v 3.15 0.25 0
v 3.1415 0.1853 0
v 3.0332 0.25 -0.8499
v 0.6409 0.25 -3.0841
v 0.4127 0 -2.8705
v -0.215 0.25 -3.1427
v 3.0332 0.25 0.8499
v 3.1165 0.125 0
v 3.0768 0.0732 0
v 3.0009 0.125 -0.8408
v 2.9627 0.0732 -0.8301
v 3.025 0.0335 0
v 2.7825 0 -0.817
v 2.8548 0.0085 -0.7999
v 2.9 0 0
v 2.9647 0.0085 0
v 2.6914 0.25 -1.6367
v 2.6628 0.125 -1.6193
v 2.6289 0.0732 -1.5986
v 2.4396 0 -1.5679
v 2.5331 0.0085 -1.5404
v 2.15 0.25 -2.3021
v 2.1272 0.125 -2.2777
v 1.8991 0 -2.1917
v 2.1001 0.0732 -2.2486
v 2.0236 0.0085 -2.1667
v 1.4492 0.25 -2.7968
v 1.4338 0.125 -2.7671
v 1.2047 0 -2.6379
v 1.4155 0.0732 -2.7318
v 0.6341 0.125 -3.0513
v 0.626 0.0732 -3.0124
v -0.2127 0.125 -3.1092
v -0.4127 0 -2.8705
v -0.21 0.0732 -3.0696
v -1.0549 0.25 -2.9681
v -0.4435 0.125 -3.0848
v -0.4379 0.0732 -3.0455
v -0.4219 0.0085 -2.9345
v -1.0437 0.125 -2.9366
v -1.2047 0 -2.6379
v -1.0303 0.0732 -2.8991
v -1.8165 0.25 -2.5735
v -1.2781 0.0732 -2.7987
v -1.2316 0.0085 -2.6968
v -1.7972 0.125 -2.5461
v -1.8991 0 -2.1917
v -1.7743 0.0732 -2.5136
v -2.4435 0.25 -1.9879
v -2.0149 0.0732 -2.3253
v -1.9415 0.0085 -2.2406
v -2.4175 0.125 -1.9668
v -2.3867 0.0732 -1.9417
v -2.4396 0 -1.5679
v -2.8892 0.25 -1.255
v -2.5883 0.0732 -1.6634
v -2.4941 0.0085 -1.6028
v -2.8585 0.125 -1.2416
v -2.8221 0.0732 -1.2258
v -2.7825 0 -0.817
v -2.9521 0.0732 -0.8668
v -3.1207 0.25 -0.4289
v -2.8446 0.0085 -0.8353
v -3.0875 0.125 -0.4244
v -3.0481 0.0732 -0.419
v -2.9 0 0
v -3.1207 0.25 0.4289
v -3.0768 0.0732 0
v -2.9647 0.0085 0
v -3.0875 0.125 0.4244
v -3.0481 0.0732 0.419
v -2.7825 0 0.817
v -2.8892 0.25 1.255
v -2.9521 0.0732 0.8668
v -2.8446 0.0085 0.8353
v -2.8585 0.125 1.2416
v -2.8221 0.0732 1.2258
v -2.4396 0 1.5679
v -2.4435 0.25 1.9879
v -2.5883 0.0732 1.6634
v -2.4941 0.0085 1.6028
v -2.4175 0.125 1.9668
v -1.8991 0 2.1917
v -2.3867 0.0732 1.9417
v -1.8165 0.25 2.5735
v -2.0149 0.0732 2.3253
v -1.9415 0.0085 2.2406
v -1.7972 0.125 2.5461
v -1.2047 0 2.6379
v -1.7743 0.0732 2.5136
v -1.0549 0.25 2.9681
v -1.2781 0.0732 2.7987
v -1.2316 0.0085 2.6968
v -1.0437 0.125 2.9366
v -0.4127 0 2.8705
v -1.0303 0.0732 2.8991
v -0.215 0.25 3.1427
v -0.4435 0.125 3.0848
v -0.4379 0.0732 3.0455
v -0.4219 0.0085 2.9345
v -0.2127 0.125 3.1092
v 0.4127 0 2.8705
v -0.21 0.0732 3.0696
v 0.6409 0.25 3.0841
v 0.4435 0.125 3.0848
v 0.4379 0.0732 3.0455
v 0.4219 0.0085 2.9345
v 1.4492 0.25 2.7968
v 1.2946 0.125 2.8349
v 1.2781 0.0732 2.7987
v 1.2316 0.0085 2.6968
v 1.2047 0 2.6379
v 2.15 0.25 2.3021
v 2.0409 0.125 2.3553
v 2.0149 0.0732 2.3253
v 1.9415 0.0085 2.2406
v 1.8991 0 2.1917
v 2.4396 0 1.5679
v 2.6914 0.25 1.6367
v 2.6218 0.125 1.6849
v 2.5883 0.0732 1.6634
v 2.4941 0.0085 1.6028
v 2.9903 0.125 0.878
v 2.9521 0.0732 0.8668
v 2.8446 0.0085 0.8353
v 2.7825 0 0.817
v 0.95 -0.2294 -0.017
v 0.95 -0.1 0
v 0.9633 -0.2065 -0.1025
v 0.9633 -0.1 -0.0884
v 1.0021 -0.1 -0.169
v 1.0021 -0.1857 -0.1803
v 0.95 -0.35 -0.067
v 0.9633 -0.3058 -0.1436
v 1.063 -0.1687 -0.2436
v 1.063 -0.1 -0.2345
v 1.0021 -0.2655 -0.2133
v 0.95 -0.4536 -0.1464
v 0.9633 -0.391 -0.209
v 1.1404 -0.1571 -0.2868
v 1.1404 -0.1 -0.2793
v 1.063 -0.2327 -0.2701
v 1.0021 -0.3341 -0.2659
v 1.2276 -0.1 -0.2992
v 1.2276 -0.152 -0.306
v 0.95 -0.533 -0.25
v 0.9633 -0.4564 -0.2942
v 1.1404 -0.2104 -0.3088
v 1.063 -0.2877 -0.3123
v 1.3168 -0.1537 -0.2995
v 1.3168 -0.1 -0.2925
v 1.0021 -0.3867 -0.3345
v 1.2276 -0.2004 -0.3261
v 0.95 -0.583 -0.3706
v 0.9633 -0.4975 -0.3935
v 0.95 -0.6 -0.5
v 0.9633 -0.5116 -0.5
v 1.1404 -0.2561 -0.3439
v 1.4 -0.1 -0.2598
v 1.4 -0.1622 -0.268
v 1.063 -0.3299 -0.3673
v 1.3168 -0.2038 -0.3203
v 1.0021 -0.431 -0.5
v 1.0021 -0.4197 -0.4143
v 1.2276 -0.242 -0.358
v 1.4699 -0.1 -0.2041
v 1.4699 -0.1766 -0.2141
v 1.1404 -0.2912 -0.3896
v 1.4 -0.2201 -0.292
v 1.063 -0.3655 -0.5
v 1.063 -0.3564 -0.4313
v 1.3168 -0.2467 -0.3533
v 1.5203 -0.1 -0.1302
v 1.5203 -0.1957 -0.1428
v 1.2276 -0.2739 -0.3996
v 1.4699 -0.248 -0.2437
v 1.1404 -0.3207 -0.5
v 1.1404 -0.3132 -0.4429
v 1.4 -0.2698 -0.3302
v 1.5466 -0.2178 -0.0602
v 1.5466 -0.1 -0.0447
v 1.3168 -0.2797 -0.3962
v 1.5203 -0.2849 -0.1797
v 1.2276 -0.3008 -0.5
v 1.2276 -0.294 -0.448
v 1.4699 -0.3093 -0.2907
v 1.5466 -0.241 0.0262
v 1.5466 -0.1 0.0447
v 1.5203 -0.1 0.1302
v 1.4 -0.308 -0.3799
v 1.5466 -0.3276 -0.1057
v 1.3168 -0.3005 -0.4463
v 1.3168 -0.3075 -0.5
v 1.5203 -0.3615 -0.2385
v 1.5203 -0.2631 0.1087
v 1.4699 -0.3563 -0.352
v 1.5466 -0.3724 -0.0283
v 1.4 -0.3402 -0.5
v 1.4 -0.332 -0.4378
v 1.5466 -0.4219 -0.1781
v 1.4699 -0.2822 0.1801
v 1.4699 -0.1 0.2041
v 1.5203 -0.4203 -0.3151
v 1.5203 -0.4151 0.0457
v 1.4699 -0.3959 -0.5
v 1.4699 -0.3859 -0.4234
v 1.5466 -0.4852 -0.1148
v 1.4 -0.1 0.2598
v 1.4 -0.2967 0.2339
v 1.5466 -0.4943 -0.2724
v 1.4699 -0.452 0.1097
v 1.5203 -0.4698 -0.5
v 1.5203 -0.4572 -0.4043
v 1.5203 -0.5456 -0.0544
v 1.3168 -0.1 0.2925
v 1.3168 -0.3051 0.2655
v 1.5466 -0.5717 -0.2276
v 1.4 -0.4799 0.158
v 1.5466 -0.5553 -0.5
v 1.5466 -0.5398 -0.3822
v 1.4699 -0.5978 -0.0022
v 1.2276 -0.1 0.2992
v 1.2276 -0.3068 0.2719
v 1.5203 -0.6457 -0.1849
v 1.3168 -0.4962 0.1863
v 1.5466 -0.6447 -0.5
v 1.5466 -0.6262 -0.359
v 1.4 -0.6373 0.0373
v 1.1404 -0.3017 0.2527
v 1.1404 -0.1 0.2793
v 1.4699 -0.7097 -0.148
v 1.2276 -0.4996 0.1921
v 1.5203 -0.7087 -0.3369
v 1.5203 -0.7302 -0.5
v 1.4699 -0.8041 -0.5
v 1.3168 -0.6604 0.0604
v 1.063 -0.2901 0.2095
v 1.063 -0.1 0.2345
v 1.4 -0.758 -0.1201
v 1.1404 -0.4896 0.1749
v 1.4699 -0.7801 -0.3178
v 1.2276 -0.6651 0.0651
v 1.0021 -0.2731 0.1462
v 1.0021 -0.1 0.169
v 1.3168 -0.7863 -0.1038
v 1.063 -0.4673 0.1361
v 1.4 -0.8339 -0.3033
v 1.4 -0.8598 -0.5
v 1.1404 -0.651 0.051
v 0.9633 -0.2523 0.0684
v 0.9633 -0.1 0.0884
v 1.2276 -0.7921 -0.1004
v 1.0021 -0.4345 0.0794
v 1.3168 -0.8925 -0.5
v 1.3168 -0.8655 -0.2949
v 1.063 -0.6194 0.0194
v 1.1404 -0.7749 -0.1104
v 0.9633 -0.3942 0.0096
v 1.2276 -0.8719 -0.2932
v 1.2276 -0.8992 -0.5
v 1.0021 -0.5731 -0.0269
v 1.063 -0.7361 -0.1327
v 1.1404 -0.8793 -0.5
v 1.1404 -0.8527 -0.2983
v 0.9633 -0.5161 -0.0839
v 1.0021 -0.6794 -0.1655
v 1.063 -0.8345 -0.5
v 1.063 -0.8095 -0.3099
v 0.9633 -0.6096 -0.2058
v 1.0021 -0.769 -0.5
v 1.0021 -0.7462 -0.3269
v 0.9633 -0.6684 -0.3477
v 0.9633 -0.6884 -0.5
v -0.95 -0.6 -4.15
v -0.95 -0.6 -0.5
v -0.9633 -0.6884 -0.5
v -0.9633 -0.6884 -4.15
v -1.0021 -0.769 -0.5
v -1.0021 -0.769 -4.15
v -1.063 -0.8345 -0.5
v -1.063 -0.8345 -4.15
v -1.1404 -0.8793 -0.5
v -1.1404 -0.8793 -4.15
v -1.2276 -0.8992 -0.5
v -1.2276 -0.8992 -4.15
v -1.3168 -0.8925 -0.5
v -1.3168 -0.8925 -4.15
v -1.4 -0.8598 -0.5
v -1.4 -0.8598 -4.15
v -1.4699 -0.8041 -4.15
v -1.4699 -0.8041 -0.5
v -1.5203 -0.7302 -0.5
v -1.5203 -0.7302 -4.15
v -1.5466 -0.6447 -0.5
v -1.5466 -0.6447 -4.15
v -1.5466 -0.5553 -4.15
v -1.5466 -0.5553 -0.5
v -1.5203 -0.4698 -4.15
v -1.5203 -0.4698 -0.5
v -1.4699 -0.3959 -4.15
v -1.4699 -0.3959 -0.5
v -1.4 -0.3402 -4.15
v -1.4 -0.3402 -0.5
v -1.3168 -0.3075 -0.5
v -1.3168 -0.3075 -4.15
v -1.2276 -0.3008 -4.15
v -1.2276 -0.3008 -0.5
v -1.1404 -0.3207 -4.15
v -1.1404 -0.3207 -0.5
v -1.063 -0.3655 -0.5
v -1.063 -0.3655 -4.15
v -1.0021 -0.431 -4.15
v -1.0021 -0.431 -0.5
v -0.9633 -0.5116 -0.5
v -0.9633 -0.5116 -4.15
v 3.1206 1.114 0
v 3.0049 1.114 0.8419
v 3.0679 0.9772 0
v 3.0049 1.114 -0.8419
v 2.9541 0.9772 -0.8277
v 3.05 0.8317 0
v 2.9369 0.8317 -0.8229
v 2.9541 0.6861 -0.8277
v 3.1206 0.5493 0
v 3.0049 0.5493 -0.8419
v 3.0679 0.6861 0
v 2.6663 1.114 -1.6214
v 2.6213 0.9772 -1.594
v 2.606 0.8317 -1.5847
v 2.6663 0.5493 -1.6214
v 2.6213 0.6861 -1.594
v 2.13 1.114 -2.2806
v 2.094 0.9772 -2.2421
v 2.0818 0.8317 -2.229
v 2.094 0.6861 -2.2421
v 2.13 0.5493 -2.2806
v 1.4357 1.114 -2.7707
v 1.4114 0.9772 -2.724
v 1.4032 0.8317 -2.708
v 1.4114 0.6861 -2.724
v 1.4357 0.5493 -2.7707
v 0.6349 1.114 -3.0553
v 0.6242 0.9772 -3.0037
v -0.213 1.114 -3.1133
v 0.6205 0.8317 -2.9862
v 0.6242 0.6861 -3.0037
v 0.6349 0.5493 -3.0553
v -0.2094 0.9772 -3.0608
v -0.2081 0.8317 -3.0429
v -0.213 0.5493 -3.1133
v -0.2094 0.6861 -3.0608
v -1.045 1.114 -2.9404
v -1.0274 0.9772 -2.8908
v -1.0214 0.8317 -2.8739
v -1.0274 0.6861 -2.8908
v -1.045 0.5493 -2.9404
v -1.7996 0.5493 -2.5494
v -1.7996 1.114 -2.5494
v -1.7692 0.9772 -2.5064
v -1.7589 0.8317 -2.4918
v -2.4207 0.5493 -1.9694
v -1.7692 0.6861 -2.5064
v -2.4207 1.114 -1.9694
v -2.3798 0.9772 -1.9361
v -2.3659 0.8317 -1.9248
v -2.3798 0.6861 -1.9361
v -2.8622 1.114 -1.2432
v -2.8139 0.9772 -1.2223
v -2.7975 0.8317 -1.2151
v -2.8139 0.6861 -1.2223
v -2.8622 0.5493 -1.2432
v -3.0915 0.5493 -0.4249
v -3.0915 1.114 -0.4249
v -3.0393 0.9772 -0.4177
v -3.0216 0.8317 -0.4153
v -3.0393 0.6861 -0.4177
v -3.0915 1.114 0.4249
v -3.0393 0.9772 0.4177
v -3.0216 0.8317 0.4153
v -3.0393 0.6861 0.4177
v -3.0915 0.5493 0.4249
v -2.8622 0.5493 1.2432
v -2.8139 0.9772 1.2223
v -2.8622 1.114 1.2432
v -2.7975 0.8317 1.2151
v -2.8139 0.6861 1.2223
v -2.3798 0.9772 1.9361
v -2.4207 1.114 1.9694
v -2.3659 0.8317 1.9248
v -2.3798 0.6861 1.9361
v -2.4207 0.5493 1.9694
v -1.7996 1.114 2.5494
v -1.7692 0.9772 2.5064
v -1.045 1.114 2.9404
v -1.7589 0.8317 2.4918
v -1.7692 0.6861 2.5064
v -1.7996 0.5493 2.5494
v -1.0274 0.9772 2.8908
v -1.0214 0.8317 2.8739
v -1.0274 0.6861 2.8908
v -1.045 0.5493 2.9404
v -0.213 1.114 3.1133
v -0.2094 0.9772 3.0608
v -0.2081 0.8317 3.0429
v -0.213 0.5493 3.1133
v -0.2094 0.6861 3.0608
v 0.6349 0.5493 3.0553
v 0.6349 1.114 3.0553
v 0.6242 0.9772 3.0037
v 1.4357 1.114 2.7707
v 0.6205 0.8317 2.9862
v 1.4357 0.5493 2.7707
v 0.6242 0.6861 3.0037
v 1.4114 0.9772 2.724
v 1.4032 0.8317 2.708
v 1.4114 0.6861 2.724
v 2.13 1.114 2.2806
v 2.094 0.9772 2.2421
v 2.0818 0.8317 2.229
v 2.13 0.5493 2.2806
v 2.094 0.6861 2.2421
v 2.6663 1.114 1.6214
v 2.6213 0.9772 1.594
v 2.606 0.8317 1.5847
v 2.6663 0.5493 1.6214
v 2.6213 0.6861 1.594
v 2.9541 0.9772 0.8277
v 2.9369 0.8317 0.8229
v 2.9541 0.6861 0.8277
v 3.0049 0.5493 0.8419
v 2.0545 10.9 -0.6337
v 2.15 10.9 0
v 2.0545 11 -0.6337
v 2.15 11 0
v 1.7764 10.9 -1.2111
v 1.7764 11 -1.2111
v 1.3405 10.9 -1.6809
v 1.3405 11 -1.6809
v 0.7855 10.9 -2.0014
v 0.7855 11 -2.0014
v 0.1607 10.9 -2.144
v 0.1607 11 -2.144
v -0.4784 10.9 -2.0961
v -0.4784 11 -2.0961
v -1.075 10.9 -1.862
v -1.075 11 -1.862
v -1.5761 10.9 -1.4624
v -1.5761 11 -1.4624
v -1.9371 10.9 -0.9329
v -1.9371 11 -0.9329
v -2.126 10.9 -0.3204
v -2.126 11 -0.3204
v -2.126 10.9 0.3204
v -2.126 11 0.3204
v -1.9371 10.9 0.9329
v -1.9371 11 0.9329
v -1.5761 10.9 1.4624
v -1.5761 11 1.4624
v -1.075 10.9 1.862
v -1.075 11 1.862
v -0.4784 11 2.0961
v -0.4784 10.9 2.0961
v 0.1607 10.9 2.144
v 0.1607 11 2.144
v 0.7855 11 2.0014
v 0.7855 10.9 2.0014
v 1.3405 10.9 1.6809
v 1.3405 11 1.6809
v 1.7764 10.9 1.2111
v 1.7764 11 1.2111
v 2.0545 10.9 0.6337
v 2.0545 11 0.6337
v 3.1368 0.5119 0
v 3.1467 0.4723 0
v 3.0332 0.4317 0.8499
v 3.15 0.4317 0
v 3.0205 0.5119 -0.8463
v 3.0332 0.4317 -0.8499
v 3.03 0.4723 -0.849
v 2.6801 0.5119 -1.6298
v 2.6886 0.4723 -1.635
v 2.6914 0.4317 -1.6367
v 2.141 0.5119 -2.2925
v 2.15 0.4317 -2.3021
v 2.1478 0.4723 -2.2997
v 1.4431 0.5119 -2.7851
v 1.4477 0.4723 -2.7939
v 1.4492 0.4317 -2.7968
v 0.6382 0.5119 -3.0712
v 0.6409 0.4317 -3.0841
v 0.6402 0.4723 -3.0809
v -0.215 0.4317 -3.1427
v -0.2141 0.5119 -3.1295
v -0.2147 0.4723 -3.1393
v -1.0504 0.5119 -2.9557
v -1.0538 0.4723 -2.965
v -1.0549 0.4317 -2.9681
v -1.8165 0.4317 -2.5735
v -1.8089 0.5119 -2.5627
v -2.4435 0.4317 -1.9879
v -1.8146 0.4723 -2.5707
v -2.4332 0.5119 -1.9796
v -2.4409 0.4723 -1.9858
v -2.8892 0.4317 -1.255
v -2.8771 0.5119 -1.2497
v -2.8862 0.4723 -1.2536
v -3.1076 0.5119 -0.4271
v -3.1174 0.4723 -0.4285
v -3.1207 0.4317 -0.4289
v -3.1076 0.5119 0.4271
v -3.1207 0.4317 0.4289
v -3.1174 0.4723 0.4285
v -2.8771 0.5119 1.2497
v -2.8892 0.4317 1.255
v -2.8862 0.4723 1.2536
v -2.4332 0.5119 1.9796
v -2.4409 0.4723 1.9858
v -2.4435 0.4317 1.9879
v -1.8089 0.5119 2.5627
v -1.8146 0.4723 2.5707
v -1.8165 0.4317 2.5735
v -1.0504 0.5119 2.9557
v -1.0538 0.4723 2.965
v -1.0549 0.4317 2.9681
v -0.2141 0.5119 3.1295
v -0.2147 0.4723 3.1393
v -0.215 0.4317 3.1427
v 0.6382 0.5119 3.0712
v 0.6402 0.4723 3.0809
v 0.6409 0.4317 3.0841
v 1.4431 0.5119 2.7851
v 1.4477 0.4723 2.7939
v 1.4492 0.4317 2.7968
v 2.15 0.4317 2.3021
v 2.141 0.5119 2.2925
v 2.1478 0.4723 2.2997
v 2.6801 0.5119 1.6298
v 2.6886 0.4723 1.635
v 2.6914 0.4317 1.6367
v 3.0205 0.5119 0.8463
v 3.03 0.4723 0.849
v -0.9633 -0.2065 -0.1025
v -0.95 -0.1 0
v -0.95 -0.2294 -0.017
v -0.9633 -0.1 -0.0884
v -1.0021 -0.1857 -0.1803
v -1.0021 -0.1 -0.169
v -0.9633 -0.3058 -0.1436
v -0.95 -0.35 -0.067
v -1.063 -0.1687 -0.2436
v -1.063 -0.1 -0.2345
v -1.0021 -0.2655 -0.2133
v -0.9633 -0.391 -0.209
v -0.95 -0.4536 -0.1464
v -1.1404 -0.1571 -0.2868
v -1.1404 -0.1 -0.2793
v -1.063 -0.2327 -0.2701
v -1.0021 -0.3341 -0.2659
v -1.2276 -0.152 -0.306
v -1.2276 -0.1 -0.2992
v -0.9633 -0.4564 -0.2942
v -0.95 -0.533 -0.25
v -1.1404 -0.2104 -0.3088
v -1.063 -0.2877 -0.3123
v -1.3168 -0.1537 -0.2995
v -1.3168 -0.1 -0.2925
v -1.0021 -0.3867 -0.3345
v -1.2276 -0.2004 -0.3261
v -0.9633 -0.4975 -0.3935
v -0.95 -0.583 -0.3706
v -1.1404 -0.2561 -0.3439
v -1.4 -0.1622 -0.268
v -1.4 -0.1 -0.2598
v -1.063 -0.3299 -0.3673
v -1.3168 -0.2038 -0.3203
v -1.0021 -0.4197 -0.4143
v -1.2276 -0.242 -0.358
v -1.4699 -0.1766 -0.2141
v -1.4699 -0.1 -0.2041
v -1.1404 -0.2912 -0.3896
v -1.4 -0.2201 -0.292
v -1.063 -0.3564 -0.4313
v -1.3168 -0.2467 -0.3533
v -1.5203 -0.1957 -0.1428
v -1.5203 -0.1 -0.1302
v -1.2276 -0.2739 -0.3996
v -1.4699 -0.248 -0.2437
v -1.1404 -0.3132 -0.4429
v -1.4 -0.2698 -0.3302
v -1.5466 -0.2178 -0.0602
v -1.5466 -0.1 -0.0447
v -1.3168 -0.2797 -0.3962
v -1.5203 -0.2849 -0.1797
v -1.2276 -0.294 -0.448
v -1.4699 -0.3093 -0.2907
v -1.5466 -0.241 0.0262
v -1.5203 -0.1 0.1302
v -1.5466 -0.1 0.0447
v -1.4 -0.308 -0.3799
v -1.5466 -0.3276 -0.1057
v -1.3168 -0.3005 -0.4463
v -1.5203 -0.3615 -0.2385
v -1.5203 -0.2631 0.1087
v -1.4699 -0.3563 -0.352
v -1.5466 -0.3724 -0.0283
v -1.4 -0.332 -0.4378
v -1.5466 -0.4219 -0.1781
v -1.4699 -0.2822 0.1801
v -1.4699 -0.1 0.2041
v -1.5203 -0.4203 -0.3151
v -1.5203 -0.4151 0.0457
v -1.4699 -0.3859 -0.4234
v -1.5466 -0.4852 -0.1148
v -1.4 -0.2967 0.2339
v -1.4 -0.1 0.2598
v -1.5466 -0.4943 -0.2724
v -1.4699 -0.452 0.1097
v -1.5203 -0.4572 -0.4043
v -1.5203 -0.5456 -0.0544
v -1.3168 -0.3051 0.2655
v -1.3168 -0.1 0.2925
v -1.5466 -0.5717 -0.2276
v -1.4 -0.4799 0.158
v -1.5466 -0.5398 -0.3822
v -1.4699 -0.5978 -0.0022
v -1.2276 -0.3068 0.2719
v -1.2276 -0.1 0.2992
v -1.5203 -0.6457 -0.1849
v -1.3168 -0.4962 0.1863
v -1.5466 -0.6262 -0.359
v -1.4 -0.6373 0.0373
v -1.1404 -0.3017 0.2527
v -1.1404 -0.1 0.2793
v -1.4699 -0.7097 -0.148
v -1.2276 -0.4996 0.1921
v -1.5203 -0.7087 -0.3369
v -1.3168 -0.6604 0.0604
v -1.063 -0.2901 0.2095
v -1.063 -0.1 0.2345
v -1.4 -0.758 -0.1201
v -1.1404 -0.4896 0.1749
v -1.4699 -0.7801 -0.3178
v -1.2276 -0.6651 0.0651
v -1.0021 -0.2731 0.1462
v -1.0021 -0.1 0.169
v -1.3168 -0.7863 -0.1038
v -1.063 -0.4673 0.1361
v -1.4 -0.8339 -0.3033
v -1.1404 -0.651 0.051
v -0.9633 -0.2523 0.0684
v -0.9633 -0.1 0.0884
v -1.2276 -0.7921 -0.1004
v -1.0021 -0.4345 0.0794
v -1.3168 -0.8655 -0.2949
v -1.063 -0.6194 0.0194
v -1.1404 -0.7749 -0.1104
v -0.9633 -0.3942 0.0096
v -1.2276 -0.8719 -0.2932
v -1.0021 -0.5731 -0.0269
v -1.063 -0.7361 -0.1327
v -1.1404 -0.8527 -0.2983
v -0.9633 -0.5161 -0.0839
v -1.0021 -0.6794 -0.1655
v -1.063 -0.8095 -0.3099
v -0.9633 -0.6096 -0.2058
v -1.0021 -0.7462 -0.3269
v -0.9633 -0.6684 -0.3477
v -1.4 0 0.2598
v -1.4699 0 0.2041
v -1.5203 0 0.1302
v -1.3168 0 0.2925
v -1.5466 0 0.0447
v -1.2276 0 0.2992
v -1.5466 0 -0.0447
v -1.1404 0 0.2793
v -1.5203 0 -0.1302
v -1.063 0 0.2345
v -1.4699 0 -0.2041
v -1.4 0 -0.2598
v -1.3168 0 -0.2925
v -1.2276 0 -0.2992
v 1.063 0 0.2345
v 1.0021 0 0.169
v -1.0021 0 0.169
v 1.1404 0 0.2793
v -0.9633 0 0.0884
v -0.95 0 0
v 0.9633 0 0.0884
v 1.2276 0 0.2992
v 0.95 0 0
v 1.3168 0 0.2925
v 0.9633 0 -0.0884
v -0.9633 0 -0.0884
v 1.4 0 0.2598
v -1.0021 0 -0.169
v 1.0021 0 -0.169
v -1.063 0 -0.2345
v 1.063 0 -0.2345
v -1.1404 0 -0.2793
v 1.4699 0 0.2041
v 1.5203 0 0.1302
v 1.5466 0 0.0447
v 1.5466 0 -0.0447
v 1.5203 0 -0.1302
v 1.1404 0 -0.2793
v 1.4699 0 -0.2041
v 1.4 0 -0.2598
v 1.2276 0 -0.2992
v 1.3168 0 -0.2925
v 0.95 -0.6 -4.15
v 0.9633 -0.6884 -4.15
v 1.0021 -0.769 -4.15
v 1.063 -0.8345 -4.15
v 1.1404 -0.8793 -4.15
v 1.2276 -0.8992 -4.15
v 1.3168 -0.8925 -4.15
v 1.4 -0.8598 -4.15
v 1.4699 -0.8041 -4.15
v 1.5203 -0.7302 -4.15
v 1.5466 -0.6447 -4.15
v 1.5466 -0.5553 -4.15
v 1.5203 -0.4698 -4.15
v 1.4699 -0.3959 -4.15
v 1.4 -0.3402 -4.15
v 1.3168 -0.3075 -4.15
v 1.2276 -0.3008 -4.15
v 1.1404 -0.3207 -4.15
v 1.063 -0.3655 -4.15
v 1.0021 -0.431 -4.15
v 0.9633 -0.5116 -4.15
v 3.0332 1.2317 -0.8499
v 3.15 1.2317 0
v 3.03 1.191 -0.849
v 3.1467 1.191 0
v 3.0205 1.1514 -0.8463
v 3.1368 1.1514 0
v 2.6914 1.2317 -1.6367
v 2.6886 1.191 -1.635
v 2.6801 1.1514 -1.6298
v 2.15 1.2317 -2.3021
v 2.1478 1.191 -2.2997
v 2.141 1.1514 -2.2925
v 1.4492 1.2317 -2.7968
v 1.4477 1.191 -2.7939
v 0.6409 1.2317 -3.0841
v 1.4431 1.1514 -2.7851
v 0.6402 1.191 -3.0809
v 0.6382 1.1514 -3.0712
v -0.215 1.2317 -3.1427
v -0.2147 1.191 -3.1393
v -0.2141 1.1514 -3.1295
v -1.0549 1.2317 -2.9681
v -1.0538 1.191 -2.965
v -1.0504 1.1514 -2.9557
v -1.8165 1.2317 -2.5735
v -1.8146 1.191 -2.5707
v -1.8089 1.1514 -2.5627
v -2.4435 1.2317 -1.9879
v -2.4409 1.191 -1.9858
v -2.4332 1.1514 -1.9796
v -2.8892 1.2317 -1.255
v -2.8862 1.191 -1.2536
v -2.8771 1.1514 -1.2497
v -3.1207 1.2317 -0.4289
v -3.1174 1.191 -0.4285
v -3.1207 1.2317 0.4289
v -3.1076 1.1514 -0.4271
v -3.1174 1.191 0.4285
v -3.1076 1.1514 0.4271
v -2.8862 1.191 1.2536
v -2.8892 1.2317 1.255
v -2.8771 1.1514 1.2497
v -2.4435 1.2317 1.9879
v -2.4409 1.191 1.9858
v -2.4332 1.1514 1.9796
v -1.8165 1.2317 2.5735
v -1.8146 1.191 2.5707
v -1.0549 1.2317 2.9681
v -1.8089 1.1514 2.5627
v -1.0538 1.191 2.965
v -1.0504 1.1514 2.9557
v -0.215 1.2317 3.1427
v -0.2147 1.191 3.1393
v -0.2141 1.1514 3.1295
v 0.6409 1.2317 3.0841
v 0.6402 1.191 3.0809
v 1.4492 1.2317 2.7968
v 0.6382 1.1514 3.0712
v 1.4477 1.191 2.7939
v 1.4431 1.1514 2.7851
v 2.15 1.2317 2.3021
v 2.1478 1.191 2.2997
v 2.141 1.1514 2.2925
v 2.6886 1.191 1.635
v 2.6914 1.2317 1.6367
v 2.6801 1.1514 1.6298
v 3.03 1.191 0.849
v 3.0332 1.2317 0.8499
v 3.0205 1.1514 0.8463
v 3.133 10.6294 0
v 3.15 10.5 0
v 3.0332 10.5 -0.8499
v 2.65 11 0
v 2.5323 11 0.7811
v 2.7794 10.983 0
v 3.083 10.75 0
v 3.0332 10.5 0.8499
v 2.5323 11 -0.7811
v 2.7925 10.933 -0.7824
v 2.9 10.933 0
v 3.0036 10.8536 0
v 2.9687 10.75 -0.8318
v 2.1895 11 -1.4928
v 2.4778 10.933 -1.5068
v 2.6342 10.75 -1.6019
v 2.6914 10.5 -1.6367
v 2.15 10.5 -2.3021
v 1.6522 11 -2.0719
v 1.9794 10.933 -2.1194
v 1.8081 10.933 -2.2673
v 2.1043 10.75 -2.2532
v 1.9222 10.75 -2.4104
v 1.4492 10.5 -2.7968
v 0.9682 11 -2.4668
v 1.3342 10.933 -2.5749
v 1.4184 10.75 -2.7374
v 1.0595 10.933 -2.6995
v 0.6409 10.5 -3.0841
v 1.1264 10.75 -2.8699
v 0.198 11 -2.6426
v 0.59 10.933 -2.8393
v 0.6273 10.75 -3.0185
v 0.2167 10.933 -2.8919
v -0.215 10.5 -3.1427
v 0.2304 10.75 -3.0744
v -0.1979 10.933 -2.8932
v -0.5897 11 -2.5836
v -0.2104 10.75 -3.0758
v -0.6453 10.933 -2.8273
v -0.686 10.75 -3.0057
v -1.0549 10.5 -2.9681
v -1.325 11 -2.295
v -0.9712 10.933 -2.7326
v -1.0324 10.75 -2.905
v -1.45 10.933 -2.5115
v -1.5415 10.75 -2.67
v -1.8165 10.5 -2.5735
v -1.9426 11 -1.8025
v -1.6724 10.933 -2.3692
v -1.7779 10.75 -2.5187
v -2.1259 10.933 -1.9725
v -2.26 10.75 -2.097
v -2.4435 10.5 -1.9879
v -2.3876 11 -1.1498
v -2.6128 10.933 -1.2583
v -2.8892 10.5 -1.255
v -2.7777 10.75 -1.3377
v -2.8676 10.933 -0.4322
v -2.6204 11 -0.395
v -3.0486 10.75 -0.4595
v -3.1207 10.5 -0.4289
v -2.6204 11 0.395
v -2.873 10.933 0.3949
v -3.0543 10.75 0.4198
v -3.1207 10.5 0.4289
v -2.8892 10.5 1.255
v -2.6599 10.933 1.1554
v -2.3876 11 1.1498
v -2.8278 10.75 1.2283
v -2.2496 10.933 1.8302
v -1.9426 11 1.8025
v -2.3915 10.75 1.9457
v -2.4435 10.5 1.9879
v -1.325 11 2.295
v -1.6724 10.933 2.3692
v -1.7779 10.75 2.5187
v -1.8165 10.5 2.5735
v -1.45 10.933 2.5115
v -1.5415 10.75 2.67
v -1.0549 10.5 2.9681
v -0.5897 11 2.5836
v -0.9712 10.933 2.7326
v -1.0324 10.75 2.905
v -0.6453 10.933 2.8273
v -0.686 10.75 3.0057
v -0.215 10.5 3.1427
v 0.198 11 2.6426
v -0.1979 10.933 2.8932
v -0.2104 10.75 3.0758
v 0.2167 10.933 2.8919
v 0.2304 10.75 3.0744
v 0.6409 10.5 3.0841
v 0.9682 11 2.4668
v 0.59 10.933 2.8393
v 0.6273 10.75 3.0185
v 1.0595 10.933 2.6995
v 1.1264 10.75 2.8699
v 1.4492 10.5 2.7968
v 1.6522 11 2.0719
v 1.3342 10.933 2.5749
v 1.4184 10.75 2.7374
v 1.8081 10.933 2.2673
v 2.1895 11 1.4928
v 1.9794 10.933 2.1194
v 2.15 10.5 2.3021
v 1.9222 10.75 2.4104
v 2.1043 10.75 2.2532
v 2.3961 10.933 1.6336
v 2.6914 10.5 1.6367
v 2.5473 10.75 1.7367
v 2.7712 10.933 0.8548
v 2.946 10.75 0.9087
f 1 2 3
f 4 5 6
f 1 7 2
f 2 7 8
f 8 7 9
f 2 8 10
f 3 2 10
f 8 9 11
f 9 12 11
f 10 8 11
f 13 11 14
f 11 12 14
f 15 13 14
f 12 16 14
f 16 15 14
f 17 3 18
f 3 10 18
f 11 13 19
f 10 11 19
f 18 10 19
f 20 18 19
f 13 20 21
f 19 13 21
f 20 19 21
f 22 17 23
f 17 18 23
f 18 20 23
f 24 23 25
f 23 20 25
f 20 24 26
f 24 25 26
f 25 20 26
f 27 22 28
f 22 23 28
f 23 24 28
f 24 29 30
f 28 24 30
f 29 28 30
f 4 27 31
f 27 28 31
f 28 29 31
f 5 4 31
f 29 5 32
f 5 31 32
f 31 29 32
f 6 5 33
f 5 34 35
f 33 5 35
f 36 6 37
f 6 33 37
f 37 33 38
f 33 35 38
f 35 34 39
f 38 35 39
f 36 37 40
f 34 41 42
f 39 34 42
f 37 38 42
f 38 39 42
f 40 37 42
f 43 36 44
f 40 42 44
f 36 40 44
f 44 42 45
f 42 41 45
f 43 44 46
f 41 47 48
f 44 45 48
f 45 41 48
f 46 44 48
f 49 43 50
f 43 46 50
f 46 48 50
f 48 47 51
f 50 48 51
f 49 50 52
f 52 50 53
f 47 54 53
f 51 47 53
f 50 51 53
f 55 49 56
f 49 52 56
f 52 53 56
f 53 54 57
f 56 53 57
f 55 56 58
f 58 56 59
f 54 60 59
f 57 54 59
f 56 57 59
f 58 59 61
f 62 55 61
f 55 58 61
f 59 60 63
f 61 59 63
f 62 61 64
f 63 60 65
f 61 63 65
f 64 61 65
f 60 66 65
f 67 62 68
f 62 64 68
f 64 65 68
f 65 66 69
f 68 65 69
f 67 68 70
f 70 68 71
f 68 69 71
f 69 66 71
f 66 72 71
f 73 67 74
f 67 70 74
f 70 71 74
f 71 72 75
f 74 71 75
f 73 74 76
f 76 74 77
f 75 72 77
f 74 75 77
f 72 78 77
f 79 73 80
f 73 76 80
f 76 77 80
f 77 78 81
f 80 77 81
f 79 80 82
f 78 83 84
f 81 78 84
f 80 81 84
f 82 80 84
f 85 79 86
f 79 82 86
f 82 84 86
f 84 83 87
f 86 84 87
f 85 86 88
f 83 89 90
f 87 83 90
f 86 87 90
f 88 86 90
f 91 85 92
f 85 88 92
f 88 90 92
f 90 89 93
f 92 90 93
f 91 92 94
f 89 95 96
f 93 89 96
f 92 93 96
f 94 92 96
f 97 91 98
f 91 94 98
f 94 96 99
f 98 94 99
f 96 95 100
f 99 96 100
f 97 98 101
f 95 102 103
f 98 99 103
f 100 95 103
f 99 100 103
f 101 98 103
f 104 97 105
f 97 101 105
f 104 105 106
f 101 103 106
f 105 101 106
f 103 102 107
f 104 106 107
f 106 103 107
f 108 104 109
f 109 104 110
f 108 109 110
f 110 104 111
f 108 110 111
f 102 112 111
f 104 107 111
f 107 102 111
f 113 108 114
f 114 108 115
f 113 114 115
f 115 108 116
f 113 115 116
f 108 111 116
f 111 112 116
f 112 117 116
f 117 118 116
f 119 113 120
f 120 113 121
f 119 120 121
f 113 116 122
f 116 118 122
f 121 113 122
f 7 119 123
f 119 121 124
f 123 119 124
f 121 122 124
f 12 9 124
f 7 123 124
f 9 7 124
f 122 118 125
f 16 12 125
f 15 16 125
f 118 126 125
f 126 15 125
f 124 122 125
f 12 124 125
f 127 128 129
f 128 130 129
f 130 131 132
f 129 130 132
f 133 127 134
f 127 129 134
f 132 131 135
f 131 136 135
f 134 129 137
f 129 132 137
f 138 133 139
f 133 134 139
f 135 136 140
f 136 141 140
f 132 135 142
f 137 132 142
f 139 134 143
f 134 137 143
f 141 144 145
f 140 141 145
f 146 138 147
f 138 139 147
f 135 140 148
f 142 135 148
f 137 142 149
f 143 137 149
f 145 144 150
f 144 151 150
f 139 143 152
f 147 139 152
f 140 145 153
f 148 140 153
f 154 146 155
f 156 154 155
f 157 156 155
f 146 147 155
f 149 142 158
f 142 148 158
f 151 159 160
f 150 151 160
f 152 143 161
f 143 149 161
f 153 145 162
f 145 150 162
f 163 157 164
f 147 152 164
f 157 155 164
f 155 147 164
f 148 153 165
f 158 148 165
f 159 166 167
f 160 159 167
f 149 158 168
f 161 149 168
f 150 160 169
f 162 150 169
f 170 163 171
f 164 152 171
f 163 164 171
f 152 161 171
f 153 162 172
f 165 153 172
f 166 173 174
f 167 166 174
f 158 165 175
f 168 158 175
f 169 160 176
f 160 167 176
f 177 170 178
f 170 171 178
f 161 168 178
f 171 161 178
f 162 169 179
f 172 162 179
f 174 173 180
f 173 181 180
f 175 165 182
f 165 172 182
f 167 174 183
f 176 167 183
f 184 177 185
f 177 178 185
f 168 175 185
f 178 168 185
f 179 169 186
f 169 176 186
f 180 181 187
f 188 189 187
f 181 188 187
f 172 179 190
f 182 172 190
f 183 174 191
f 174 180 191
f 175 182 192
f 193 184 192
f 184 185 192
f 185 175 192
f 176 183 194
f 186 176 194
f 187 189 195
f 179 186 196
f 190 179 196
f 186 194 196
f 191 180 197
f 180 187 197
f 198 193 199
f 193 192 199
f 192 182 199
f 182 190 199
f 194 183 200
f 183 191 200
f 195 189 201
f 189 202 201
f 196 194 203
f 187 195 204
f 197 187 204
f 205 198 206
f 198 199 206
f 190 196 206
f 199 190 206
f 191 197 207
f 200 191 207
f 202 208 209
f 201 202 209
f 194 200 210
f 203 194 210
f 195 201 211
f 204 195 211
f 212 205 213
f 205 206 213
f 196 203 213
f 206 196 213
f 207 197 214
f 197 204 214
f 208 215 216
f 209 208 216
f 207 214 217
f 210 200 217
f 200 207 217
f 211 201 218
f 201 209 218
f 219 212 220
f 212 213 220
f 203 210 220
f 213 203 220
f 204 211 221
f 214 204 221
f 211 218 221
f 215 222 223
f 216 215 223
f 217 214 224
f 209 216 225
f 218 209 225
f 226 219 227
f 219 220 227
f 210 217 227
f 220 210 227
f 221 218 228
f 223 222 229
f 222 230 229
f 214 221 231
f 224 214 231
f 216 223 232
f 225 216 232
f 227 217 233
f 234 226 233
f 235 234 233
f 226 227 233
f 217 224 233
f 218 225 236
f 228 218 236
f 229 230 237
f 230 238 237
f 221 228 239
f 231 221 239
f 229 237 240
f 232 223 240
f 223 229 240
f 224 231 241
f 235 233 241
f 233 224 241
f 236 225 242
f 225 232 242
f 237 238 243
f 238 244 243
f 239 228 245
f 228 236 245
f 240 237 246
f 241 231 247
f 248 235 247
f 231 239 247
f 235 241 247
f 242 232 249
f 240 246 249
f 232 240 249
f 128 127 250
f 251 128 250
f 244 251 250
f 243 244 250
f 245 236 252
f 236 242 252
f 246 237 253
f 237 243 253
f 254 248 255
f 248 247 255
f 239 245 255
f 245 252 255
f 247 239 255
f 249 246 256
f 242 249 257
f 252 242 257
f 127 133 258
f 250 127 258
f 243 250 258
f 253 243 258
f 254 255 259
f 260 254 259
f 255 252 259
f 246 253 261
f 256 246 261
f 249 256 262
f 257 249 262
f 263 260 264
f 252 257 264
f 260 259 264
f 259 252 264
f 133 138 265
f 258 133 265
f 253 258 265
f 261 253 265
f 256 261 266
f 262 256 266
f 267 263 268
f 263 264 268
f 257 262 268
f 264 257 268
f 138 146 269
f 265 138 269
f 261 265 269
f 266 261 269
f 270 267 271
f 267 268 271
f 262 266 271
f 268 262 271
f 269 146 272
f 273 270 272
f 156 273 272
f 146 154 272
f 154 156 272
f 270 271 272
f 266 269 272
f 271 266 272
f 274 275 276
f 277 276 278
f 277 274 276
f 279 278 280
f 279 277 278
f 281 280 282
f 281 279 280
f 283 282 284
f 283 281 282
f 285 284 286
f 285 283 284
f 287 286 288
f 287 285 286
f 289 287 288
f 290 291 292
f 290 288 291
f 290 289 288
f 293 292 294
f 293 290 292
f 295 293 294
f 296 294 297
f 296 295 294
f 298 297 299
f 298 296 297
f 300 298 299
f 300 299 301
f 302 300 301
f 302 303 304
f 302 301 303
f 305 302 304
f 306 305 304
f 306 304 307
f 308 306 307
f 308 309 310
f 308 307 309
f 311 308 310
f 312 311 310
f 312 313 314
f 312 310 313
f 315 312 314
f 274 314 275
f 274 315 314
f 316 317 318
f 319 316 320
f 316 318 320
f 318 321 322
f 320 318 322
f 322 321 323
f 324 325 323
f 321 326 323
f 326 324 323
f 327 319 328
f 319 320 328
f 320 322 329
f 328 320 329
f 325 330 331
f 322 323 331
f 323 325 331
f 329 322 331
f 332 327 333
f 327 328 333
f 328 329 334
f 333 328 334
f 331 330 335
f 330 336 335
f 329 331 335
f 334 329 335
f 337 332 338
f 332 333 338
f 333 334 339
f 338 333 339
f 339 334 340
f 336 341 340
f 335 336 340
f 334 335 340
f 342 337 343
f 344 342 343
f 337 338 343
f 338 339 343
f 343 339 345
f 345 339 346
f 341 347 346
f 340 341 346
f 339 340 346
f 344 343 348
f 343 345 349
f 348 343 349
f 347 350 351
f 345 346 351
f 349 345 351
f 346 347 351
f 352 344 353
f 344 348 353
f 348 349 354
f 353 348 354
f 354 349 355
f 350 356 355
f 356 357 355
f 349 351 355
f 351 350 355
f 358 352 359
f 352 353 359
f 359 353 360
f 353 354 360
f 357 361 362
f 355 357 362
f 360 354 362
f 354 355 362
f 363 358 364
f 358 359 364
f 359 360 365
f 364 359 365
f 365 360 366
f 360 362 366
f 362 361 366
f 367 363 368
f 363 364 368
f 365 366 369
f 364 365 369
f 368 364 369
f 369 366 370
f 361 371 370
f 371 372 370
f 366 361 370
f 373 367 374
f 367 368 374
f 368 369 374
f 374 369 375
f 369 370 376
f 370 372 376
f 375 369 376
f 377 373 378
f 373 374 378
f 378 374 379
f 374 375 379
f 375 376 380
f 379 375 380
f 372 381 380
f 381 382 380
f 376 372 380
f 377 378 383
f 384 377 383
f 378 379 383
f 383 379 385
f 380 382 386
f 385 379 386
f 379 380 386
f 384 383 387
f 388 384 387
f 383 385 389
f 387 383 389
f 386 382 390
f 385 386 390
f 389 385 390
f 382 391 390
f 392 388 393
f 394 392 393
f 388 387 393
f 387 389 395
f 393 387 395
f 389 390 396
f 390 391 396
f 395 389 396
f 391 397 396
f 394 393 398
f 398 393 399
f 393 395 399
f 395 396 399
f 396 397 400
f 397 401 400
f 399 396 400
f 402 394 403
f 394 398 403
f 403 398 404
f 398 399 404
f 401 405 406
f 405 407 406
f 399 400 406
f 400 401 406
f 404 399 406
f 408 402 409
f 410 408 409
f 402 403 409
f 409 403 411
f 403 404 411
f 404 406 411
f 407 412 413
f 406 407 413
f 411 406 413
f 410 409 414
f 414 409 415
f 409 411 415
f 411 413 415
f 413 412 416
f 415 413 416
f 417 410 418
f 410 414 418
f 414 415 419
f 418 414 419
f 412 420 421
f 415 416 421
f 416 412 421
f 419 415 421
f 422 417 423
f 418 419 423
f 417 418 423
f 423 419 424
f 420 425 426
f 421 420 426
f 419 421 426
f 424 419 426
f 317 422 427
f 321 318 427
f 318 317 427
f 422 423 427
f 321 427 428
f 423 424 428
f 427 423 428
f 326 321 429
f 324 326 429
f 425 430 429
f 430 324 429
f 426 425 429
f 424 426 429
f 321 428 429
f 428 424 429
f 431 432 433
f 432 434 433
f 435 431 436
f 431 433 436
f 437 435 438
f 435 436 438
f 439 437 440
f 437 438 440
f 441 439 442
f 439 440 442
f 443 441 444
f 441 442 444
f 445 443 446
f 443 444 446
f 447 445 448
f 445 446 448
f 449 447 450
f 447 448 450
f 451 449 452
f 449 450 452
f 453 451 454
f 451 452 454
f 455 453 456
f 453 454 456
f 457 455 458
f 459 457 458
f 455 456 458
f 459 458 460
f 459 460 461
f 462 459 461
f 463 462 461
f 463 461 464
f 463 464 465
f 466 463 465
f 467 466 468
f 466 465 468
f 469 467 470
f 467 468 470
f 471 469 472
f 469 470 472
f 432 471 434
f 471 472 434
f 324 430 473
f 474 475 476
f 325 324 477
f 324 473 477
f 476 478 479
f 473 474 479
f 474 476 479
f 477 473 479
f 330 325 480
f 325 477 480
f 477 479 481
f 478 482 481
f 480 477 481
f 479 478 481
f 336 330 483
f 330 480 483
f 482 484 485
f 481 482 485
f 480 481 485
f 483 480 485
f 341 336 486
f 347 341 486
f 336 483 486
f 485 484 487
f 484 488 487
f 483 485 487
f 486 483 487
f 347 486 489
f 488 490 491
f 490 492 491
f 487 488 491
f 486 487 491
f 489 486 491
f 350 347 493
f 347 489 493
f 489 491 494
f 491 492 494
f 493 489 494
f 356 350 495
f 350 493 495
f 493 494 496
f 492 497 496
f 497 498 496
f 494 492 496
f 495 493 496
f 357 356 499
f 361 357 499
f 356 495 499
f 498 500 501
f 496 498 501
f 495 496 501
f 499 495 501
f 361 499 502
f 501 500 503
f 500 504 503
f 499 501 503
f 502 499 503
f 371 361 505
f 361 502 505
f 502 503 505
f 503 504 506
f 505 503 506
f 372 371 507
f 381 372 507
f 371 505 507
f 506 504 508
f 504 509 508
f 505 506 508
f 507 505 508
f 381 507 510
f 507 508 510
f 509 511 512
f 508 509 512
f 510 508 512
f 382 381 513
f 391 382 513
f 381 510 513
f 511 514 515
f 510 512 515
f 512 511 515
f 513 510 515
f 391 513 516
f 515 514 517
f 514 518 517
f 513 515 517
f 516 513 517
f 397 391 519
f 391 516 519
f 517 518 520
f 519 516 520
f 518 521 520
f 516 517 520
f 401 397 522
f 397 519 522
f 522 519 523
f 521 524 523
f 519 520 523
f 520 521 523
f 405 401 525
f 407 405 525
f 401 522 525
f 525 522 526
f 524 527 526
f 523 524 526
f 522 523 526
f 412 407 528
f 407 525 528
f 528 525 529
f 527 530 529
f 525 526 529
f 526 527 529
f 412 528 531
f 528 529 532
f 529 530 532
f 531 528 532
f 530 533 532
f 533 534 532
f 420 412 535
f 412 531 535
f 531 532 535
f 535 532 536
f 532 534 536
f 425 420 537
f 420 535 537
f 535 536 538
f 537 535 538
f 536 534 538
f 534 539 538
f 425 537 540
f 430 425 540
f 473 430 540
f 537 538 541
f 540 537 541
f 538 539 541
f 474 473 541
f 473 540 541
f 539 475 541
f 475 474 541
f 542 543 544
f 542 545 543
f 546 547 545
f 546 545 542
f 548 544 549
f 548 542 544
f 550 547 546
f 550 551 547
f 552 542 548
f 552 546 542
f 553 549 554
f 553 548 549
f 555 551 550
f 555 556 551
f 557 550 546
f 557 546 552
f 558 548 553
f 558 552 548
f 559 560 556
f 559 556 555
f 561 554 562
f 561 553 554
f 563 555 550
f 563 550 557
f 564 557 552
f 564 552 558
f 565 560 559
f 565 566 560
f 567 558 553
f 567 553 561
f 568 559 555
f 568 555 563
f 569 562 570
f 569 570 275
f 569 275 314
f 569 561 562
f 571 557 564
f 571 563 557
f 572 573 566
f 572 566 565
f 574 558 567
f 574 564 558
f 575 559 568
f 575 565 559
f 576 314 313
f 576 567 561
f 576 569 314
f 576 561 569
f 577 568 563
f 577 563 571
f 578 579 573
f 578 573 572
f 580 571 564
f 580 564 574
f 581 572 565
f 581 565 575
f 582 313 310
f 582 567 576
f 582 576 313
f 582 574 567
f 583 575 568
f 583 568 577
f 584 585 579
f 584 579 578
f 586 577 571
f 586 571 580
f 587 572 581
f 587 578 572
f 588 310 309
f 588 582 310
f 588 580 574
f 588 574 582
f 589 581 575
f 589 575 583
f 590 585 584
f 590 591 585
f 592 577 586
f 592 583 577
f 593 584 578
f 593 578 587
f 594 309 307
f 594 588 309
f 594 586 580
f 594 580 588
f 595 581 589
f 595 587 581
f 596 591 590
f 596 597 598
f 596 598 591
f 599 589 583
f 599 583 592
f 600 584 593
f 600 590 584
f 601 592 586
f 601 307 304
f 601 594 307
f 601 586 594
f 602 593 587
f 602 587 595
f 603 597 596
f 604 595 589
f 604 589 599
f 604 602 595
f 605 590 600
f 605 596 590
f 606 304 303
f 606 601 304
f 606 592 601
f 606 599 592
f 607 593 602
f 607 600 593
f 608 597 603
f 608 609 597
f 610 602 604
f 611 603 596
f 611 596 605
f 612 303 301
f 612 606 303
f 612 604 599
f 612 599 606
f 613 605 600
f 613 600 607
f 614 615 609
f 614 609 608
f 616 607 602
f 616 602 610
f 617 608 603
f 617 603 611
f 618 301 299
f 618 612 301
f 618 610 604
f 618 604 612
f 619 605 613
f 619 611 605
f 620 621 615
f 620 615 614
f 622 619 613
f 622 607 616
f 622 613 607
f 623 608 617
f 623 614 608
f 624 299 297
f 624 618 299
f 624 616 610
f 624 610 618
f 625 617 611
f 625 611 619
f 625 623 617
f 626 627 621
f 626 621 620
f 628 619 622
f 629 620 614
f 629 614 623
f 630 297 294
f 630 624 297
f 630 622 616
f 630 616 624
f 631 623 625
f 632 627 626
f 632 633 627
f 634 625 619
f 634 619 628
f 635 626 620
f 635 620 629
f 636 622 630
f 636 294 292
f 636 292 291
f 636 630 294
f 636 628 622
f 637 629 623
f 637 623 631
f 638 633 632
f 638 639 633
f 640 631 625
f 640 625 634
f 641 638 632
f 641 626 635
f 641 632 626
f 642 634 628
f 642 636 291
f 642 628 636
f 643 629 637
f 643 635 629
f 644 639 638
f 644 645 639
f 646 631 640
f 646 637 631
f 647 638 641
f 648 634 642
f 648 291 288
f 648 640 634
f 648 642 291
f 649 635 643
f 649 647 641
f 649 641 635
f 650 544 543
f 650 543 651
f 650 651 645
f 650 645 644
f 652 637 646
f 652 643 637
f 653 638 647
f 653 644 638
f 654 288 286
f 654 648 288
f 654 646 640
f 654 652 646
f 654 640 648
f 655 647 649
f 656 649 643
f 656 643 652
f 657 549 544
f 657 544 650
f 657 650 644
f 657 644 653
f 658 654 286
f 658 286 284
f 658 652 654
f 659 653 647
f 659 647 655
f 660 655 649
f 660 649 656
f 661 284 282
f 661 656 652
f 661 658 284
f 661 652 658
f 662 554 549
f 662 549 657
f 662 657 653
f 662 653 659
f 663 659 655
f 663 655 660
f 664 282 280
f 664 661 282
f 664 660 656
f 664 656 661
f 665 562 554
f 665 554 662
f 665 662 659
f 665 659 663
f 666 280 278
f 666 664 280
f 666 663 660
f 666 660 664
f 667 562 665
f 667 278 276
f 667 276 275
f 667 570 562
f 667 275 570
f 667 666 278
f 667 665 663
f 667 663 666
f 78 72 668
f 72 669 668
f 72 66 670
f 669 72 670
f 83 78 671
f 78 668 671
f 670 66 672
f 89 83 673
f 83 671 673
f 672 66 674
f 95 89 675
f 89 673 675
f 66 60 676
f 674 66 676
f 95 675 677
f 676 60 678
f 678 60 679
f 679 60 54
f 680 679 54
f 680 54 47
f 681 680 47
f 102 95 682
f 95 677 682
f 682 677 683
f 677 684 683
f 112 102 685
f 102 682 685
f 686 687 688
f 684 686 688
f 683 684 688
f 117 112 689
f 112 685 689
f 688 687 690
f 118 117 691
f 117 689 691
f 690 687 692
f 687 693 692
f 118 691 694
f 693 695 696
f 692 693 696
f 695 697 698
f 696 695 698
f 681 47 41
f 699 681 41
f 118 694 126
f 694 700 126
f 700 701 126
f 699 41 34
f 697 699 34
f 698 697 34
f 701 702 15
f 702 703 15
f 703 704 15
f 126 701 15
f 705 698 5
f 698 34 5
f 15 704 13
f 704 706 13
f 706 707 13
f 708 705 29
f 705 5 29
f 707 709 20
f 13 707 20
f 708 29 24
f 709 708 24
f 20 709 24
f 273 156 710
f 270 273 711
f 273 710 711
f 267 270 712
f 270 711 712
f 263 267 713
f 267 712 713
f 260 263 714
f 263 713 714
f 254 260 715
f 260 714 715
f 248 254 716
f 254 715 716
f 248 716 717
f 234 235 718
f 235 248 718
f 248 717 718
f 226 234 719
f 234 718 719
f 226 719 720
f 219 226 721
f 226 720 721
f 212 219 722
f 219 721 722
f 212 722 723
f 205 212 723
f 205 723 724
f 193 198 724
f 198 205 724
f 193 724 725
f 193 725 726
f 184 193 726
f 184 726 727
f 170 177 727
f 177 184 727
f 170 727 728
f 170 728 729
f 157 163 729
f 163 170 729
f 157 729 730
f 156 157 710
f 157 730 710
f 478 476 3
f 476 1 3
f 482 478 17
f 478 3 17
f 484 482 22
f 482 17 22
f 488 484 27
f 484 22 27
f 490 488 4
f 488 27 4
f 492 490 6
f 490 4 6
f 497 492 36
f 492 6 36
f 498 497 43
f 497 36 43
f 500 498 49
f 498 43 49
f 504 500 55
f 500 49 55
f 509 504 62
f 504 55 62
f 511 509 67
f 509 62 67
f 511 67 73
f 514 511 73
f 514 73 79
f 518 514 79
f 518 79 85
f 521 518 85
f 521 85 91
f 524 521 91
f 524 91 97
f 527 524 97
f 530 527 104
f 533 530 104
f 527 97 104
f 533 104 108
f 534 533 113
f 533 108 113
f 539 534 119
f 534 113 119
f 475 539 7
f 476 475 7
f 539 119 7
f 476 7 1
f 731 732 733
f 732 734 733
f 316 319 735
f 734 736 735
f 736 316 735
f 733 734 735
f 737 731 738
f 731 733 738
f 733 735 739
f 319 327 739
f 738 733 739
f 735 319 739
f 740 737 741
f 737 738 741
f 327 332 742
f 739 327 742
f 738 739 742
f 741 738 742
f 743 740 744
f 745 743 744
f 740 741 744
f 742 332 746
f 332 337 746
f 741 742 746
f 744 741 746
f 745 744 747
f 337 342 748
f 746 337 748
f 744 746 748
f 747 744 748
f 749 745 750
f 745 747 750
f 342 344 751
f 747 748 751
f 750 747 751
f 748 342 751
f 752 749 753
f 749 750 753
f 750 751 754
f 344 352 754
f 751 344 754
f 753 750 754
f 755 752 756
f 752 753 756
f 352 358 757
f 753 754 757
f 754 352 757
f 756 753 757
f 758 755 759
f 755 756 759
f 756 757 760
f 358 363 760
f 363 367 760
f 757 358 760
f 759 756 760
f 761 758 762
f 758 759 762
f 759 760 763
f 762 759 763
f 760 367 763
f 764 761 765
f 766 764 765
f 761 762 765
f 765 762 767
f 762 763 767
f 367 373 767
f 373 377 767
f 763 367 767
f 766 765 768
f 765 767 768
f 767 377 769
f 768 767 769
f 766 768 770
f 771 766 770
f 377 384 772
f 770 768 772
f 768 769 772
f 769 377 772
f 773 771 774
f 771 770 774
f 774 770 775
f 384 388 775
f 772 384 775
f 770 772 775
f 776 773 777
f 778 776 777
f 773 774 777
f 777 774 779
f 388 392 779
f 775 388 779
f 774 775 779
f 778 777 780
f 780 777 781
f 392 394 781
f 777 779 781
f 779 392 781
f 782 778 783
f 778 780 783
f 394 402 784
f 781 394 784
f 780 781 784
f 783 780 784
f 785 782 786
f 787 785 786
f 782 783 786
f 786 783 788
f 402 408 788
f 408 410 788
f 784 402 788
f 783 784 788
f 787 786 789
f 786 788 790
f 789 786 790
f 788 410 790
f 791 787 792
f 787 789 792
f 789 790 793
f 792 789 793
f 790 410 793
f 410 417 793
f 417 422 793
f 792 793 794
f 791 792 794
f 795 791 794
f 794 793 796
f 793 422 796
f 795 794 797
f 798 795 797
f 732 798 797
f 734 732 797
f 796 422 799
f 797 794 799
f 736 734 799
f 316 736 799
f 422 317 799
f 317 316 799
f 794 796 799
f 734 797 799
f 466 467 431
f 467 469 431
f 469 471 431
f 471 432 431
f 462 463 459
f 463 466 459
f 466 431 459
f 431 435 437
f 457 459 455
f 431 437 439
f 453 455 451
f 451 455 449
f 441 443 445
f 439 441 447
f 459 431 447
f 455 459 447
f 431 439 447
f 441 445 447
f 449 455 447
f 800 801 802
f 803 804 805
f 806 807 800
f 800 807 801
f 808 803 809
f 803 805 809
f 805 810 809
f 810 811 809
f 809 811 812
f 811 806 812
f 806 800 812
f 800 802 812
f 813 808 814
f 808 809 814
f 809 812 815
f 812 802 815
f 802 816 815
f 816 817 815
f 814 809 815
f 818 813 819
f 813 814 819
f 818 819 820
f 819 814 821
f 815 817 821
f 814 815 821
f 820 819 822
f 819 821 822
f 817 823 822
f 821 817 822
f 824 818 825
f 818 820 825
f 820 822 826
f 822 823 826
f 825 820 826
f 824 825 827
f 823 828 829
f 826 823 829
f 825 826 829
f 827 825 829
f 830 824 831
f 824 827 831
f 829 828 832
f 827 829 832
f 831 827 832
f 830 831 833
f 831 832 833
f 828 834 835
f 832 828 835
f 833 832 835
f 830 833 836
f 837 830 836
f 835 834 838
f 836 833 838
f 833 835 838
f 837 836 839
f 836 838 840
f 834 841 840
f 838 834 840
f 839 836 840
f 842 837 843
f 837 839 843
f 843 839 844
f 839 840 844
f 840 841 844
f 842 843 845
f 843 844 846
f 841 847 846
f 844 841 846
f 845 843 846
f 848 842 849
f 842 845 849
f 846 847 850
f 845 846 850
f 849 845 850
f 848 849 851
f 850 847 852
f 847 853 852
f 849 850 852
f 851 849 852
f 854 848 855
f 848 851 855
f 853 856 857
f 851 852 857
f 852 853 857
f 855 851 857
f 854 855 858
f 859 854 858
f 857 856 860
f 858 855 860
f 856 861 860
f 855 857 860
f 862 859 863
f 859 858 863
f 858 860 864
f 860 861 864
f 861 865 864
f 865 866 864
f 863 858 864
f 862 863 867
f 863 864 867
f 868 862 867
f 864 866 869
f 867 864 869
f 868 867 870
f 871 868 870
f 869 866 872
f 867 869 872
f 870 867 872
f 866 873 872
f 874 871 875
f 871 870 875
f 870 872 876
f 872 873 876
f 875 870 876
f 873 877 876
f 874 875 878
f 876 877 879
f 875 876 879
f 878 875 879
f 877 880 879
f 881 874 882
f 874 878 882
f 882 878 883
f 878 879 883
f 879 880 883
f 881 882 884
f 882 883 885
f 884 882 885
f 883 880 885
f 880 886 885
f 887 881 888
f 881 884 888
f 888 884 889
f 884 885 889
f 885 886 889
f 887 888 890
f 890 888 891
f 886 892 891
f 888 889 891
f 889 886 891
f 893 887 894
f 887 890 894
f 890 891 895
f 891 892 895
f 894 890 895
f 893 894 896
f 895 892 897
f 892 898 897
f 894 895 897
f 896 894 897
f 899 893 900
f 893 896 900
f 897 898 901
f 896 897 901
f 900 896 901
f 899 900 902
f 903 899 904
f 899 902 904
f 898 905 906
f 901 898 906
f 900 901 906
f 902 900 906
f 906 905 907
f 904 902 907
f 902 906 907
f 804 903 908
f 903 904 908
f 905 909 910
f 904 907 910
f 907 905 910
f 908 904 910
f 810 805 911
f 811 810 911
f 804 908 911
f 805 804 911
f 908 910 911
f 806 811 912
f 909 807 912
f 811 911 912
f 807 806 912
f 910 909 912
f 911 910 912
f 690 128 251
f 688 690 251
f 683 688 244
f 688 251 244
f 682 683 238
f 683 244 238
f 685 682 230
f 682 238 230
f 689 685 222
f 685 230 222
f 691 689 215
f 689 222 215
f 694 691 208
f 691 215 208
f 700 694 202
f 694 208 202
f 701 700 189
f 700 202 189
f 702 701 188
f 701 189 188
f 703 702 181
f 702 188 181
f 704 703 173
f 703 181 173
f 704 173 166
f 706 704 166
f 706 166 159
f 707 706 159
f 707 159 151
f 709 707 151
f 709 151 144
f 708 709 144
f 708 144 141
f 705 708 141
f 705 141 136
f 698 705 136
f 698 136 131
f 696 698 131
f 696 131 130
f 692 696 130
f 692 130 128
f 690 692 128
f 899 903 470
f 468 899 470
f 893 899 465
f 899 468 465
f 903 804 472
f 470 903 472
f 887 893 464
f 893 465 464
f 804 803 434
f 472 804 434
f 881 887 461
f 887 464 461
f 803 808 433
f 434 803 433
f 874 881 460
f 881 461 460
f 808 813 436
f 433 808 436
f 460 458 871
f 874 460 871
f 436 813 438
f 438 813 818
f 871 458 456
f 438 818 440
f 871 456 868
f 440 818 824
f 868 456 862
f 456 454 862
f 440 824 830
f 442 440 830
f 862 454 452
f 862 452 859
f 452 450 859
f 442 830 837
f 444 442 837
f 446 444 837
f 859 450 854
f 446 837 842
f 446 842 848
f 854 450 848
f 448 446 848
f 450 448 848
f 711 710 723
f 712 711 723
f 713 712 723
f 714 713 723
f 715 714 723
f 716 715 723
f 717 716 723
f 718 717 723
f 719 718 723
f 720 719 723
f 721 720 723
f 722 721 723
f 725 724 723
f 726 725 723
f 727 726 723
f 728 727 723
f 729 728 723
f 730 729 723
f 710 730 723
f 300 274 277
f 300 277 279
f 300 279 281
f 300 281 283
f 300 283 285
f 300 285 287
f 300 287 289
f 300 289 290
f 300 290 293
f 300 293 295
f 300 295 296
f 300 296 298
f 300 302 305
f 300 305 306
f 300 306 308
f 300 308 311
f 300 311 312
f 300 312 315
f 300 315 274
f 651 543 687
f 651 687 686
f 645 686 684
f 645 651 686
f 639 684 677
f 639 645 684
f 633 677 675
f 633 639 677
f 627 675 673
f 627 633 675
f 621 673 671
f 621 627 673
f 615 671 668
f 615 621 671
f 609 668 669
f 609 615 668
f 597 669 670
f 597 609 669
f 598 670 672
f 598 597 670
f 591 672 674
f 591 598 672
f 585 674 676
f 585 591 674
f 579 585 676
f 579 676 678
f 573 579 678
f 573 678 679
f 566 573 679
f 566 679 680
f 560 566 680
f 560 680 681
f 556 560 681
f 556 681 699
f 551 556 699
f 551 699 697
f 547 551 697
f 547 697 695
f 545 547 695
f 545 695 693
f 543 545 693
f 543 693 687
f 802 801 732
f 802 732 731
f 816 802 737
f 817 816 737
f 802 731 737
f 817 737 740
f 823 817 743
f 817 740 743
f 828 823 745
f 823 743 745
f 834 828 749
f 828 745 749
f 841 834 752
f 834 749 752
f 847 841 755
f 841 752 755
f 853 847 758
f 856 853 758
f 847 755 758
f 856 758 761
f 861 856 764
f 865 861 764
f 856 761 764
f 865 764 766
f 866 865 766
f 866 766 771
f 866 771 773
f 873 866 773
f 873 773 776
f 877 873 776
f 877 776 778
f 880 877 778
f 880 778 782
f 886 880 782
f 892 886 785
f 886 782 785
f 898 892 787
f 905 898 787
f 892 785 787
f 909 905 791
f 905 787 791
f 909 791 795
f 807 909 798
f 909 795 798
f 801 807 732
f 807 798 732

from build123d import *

# Parameters (mm, degrees)
SKETCH4_R = 0.3


with BuildPart() as part:
    # Sketch1 → Revolve1 (revolve)
    with BuildSketch(Plane.XY):
        with BuildLine():
            Line((0, 10.9), (2.15, 10.9))
            Line((2.15, 10.9), (2.15, 11))
            Line((2.15, 11), (2.65, 11))
            ThreePointArc((2.65, 11), (3.003553391, 10.853553391), (3.15, 10.5))
            Line((3.15, 10.5), (3.15, 1.231662479))
            ThreePointArc((3.15, 1.231662479), (3.142535625, 1.171028573), (3.120588235, 1.11401542))
            ThreePointArc((3.120588235, 1.11401542), (3.05, 0.831662479), (3.120588235, 0.549309538))
            ThreePointArc((3.120588235, 0.549309538), (3.142535625, 0.492296385), (3.15, 0.431662479))
            Line((3.15, 0.431662479), (3.15, 0.25))
            ThreePointArc((3.15, 0.25), (3.076776695, 0.073223305), (2.9, 0))
            Line((2.9, 0), (0, 0))
            Line((0, 0), (0, 10.9))
        make_face()
    revolve(axis=Axis((0, 0, 0), (0, 1, 0)))

    # Sweep1: sweep along a path in Sketch5
    with BuildLine(Plane(origin=(-1.25, 0, 0), x_dir=(0, 0, -1), z_dir=(1, 0, 0))) as sweep1_path:
        Line((0, 0), (0, -0.1))
        ThreePointArc((0, -0.1), (0.146446609, -0.453553391), (0.5, -0.6))
        Line((0.5, -0.6), (4.15, -0.6))
    # Sketch4 → Sweep1 (sweep)
    with BuildSketch(Plane.XZ):
        with Locations((-1.25, 0)):
            Circle(SKETCH4_R)
    sweep1 = sweep(path=sweep1_path.line)

    # Mirror1: Sweep1 across plane
    add(sweep1.mirror(Plane(origin=(0, 0, 0), x_dir=(0, 0, 1), z_dir=(1, 0, 0))))


solid = part.part
